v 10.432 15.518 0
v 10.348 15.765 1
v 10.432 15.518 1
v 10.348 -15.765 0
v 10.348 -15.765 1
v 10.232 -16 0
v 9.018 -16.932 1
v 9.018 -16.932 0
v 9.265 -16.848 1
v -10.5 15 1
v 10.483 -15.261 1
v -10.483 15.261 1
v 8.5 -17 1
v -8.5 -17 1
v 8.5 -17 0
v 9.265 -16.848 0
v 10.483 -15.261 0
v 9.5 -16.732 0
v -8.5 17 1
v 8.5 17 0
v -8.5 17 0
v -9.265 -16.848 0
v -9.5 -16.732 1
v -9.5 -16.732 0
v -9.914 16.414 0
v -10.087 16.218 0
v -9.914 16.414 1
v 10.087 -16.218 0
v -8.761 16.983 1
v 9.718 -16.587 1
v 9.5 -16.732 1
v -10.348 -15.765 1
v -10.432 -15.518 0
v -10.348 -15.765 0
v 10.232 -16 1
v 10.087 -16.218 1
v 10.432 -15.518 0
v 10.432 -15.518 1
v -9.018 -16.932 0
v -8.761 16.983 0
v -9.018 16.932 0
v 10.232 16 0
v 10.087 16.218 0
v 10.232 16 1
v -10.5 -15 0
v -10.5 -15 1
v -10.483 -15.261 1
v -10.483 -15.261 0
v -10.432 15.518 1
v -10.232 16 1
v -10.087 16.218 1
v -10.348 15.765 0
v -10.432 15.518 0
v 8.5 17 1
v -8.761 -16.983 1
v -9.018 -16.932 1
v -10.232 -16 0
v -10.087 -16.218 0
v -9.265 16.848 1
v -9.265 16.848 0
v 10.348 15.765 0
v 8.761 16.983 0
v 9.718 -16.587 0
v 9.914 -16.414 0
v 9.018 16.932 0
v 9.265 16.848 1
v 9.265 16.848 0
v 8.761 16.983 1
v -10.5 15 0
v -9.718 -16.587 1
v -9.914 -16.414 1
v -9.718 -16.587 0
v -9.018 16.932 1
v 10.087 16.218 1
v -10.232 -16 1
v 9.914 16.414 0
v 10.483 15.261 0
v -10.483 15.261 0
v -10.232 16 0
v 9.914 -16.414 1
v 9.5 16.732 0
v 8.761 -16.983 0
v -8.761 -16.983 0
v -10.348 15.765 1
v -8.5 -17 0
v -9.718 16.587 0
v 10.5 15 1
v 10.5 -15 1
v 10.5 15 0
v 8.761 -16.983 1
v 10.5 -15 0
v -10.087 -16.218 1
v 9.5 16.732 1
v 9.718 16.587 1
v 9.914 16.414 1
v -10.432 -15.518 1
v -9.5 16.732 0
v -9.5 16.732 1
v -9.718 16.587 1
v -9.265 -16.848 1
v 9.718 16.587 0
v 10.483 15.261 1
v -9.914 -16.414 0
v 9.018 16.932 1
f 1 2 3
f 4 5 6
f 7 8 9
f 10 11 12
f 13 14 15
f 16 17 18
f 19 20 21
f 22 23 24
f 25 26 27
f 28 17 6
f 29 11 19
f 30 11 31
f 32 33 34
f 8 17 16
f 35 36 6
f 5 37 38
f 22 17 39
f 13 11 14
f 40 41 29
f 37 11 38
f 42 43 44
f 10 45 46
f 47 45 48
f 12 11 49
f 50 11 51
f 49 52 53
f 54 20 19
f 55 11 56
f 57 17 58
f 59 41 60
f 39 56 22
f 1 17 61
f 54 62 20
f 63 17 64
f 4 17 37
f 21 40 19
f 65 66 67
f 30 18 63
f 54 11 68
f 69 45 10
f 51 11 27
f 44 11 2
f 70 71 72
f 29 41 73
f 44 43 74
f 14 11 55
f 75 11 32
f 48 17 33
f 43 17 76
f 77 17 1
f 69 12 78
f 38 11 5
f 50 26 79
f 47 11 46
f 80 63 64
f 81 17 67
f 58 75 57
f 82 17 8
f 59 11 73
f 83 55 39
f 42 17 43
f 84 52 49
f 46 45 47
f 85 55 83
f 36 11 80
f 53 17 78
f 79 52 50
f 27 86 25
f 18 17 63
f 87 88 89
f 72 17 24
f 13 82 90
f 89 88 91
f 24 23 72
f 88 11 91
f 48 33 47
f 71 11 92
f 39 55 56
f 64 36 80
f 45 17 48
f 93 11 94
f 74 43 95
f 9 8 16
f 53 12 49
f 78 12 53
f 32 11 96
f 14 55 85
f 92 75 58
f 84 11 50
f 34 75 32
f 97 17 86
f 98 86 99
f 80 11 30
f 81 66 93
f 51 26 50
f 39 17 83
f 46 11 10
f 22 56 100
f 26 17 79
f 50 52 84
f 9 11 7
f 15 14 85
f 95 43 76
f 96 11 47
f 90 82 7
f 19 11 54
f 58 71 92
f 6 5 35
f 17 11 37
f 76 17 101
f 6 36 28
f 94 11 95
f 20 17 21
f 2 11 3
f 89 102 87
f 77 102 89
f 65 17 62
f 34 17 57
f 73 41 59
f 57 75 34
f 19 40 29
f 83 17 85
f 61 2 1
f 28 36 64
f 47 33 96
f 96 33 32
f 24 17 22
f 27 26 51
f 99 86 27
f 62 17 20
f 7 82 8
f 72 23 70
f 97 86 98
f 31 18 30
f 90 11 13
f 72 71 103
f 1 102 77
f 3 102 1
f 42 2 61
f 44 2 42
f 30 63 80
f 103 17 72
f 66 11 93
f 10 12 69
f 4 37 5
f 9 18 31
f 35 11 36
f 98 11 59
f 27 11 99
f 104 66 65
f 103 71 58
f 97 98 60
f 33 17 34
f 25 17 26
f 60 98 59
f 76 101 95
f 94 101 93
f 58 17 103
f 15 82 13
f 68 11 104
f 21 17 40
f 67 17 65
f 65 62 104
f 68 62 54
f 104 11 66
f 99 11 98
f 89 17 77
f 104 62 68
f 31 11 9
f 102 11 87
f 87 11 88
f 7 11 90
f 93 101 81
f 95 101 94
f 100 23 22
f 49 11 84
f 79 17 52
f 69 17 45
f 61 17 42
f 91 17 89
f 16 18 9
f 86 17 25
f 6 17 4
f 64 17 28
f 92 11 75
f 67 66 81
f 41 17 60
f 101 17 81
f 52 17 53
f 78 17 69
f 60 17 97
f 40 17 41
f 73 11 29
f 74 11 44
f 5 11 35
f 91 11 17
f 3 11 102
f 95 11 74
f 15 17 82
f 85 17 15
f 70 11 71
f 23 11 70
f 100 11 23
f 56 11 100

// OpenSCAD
// ============================================================
//  Battery Shim — sits ON TOP of foam tape, UNDER the DRV2605L
//  Spreads DRV's solder-pip/header-pin contact points across a
//  rigid plate instead of letting them press into the bare
//  LiPo pouch. Foam tape goes BETWEEN the cell and this shim —
//  the shim alone does not replace the foam, they work together.
//
//  Stack order (bottom to top): floor -> LiPo -> foam tape ->
//  this shim -> DRV2605L -> PowerBoost
//
//  Sized intentionally SHORTER than the 40mm cell length (not
//  full coverage) so a JST/wire tail exiting either short end
//  of the cell has clear room to escape without being pinched
//  under the shim's edge — direction of the tail wasn't known,
//  so clearance is symmetric on both ends.
//
//  SHIM_T is the one parameter you'll likely iterate on: print
//  a couple of thicknesses (e.g. 0.8 / 1.2 / 1.6mm) and use
//  whichever brings PB's top closest to the ~19mm-from-floor
//  height the lid capture nubs (wrist_puck_enclosure_4_5.scad)
//  were sized against. Each is cheap and fast to print flat.
//
//  Print flat on the bed, no supports, PETG, 0.2mm layers.
// ============================================================

SHIM_W      = 21.0;   // X — comfortably wider than DRV_W (20.3mm)
SHIM_D      = 34.0;   // Y — shorter than the 40mm cell on purpose
SHIM_T      = 1.0;    // thickness — the parameter to iterate on
CORNER_R    = 2.0;    // corner rounding radius
$fn         = 48;

module battery_shim() {
    hull() {
        for (sx = [-1, 1])
            for (sy = [-1, 1])
                translate([sx*(SHIM_W/2 - CORNER_R),
                           sy*(SHIM_D/2 - CORNER_R), 0])
                    cylinder(h = SHIM_T, r = CORNER_R);
    }
}

battery_shim();
